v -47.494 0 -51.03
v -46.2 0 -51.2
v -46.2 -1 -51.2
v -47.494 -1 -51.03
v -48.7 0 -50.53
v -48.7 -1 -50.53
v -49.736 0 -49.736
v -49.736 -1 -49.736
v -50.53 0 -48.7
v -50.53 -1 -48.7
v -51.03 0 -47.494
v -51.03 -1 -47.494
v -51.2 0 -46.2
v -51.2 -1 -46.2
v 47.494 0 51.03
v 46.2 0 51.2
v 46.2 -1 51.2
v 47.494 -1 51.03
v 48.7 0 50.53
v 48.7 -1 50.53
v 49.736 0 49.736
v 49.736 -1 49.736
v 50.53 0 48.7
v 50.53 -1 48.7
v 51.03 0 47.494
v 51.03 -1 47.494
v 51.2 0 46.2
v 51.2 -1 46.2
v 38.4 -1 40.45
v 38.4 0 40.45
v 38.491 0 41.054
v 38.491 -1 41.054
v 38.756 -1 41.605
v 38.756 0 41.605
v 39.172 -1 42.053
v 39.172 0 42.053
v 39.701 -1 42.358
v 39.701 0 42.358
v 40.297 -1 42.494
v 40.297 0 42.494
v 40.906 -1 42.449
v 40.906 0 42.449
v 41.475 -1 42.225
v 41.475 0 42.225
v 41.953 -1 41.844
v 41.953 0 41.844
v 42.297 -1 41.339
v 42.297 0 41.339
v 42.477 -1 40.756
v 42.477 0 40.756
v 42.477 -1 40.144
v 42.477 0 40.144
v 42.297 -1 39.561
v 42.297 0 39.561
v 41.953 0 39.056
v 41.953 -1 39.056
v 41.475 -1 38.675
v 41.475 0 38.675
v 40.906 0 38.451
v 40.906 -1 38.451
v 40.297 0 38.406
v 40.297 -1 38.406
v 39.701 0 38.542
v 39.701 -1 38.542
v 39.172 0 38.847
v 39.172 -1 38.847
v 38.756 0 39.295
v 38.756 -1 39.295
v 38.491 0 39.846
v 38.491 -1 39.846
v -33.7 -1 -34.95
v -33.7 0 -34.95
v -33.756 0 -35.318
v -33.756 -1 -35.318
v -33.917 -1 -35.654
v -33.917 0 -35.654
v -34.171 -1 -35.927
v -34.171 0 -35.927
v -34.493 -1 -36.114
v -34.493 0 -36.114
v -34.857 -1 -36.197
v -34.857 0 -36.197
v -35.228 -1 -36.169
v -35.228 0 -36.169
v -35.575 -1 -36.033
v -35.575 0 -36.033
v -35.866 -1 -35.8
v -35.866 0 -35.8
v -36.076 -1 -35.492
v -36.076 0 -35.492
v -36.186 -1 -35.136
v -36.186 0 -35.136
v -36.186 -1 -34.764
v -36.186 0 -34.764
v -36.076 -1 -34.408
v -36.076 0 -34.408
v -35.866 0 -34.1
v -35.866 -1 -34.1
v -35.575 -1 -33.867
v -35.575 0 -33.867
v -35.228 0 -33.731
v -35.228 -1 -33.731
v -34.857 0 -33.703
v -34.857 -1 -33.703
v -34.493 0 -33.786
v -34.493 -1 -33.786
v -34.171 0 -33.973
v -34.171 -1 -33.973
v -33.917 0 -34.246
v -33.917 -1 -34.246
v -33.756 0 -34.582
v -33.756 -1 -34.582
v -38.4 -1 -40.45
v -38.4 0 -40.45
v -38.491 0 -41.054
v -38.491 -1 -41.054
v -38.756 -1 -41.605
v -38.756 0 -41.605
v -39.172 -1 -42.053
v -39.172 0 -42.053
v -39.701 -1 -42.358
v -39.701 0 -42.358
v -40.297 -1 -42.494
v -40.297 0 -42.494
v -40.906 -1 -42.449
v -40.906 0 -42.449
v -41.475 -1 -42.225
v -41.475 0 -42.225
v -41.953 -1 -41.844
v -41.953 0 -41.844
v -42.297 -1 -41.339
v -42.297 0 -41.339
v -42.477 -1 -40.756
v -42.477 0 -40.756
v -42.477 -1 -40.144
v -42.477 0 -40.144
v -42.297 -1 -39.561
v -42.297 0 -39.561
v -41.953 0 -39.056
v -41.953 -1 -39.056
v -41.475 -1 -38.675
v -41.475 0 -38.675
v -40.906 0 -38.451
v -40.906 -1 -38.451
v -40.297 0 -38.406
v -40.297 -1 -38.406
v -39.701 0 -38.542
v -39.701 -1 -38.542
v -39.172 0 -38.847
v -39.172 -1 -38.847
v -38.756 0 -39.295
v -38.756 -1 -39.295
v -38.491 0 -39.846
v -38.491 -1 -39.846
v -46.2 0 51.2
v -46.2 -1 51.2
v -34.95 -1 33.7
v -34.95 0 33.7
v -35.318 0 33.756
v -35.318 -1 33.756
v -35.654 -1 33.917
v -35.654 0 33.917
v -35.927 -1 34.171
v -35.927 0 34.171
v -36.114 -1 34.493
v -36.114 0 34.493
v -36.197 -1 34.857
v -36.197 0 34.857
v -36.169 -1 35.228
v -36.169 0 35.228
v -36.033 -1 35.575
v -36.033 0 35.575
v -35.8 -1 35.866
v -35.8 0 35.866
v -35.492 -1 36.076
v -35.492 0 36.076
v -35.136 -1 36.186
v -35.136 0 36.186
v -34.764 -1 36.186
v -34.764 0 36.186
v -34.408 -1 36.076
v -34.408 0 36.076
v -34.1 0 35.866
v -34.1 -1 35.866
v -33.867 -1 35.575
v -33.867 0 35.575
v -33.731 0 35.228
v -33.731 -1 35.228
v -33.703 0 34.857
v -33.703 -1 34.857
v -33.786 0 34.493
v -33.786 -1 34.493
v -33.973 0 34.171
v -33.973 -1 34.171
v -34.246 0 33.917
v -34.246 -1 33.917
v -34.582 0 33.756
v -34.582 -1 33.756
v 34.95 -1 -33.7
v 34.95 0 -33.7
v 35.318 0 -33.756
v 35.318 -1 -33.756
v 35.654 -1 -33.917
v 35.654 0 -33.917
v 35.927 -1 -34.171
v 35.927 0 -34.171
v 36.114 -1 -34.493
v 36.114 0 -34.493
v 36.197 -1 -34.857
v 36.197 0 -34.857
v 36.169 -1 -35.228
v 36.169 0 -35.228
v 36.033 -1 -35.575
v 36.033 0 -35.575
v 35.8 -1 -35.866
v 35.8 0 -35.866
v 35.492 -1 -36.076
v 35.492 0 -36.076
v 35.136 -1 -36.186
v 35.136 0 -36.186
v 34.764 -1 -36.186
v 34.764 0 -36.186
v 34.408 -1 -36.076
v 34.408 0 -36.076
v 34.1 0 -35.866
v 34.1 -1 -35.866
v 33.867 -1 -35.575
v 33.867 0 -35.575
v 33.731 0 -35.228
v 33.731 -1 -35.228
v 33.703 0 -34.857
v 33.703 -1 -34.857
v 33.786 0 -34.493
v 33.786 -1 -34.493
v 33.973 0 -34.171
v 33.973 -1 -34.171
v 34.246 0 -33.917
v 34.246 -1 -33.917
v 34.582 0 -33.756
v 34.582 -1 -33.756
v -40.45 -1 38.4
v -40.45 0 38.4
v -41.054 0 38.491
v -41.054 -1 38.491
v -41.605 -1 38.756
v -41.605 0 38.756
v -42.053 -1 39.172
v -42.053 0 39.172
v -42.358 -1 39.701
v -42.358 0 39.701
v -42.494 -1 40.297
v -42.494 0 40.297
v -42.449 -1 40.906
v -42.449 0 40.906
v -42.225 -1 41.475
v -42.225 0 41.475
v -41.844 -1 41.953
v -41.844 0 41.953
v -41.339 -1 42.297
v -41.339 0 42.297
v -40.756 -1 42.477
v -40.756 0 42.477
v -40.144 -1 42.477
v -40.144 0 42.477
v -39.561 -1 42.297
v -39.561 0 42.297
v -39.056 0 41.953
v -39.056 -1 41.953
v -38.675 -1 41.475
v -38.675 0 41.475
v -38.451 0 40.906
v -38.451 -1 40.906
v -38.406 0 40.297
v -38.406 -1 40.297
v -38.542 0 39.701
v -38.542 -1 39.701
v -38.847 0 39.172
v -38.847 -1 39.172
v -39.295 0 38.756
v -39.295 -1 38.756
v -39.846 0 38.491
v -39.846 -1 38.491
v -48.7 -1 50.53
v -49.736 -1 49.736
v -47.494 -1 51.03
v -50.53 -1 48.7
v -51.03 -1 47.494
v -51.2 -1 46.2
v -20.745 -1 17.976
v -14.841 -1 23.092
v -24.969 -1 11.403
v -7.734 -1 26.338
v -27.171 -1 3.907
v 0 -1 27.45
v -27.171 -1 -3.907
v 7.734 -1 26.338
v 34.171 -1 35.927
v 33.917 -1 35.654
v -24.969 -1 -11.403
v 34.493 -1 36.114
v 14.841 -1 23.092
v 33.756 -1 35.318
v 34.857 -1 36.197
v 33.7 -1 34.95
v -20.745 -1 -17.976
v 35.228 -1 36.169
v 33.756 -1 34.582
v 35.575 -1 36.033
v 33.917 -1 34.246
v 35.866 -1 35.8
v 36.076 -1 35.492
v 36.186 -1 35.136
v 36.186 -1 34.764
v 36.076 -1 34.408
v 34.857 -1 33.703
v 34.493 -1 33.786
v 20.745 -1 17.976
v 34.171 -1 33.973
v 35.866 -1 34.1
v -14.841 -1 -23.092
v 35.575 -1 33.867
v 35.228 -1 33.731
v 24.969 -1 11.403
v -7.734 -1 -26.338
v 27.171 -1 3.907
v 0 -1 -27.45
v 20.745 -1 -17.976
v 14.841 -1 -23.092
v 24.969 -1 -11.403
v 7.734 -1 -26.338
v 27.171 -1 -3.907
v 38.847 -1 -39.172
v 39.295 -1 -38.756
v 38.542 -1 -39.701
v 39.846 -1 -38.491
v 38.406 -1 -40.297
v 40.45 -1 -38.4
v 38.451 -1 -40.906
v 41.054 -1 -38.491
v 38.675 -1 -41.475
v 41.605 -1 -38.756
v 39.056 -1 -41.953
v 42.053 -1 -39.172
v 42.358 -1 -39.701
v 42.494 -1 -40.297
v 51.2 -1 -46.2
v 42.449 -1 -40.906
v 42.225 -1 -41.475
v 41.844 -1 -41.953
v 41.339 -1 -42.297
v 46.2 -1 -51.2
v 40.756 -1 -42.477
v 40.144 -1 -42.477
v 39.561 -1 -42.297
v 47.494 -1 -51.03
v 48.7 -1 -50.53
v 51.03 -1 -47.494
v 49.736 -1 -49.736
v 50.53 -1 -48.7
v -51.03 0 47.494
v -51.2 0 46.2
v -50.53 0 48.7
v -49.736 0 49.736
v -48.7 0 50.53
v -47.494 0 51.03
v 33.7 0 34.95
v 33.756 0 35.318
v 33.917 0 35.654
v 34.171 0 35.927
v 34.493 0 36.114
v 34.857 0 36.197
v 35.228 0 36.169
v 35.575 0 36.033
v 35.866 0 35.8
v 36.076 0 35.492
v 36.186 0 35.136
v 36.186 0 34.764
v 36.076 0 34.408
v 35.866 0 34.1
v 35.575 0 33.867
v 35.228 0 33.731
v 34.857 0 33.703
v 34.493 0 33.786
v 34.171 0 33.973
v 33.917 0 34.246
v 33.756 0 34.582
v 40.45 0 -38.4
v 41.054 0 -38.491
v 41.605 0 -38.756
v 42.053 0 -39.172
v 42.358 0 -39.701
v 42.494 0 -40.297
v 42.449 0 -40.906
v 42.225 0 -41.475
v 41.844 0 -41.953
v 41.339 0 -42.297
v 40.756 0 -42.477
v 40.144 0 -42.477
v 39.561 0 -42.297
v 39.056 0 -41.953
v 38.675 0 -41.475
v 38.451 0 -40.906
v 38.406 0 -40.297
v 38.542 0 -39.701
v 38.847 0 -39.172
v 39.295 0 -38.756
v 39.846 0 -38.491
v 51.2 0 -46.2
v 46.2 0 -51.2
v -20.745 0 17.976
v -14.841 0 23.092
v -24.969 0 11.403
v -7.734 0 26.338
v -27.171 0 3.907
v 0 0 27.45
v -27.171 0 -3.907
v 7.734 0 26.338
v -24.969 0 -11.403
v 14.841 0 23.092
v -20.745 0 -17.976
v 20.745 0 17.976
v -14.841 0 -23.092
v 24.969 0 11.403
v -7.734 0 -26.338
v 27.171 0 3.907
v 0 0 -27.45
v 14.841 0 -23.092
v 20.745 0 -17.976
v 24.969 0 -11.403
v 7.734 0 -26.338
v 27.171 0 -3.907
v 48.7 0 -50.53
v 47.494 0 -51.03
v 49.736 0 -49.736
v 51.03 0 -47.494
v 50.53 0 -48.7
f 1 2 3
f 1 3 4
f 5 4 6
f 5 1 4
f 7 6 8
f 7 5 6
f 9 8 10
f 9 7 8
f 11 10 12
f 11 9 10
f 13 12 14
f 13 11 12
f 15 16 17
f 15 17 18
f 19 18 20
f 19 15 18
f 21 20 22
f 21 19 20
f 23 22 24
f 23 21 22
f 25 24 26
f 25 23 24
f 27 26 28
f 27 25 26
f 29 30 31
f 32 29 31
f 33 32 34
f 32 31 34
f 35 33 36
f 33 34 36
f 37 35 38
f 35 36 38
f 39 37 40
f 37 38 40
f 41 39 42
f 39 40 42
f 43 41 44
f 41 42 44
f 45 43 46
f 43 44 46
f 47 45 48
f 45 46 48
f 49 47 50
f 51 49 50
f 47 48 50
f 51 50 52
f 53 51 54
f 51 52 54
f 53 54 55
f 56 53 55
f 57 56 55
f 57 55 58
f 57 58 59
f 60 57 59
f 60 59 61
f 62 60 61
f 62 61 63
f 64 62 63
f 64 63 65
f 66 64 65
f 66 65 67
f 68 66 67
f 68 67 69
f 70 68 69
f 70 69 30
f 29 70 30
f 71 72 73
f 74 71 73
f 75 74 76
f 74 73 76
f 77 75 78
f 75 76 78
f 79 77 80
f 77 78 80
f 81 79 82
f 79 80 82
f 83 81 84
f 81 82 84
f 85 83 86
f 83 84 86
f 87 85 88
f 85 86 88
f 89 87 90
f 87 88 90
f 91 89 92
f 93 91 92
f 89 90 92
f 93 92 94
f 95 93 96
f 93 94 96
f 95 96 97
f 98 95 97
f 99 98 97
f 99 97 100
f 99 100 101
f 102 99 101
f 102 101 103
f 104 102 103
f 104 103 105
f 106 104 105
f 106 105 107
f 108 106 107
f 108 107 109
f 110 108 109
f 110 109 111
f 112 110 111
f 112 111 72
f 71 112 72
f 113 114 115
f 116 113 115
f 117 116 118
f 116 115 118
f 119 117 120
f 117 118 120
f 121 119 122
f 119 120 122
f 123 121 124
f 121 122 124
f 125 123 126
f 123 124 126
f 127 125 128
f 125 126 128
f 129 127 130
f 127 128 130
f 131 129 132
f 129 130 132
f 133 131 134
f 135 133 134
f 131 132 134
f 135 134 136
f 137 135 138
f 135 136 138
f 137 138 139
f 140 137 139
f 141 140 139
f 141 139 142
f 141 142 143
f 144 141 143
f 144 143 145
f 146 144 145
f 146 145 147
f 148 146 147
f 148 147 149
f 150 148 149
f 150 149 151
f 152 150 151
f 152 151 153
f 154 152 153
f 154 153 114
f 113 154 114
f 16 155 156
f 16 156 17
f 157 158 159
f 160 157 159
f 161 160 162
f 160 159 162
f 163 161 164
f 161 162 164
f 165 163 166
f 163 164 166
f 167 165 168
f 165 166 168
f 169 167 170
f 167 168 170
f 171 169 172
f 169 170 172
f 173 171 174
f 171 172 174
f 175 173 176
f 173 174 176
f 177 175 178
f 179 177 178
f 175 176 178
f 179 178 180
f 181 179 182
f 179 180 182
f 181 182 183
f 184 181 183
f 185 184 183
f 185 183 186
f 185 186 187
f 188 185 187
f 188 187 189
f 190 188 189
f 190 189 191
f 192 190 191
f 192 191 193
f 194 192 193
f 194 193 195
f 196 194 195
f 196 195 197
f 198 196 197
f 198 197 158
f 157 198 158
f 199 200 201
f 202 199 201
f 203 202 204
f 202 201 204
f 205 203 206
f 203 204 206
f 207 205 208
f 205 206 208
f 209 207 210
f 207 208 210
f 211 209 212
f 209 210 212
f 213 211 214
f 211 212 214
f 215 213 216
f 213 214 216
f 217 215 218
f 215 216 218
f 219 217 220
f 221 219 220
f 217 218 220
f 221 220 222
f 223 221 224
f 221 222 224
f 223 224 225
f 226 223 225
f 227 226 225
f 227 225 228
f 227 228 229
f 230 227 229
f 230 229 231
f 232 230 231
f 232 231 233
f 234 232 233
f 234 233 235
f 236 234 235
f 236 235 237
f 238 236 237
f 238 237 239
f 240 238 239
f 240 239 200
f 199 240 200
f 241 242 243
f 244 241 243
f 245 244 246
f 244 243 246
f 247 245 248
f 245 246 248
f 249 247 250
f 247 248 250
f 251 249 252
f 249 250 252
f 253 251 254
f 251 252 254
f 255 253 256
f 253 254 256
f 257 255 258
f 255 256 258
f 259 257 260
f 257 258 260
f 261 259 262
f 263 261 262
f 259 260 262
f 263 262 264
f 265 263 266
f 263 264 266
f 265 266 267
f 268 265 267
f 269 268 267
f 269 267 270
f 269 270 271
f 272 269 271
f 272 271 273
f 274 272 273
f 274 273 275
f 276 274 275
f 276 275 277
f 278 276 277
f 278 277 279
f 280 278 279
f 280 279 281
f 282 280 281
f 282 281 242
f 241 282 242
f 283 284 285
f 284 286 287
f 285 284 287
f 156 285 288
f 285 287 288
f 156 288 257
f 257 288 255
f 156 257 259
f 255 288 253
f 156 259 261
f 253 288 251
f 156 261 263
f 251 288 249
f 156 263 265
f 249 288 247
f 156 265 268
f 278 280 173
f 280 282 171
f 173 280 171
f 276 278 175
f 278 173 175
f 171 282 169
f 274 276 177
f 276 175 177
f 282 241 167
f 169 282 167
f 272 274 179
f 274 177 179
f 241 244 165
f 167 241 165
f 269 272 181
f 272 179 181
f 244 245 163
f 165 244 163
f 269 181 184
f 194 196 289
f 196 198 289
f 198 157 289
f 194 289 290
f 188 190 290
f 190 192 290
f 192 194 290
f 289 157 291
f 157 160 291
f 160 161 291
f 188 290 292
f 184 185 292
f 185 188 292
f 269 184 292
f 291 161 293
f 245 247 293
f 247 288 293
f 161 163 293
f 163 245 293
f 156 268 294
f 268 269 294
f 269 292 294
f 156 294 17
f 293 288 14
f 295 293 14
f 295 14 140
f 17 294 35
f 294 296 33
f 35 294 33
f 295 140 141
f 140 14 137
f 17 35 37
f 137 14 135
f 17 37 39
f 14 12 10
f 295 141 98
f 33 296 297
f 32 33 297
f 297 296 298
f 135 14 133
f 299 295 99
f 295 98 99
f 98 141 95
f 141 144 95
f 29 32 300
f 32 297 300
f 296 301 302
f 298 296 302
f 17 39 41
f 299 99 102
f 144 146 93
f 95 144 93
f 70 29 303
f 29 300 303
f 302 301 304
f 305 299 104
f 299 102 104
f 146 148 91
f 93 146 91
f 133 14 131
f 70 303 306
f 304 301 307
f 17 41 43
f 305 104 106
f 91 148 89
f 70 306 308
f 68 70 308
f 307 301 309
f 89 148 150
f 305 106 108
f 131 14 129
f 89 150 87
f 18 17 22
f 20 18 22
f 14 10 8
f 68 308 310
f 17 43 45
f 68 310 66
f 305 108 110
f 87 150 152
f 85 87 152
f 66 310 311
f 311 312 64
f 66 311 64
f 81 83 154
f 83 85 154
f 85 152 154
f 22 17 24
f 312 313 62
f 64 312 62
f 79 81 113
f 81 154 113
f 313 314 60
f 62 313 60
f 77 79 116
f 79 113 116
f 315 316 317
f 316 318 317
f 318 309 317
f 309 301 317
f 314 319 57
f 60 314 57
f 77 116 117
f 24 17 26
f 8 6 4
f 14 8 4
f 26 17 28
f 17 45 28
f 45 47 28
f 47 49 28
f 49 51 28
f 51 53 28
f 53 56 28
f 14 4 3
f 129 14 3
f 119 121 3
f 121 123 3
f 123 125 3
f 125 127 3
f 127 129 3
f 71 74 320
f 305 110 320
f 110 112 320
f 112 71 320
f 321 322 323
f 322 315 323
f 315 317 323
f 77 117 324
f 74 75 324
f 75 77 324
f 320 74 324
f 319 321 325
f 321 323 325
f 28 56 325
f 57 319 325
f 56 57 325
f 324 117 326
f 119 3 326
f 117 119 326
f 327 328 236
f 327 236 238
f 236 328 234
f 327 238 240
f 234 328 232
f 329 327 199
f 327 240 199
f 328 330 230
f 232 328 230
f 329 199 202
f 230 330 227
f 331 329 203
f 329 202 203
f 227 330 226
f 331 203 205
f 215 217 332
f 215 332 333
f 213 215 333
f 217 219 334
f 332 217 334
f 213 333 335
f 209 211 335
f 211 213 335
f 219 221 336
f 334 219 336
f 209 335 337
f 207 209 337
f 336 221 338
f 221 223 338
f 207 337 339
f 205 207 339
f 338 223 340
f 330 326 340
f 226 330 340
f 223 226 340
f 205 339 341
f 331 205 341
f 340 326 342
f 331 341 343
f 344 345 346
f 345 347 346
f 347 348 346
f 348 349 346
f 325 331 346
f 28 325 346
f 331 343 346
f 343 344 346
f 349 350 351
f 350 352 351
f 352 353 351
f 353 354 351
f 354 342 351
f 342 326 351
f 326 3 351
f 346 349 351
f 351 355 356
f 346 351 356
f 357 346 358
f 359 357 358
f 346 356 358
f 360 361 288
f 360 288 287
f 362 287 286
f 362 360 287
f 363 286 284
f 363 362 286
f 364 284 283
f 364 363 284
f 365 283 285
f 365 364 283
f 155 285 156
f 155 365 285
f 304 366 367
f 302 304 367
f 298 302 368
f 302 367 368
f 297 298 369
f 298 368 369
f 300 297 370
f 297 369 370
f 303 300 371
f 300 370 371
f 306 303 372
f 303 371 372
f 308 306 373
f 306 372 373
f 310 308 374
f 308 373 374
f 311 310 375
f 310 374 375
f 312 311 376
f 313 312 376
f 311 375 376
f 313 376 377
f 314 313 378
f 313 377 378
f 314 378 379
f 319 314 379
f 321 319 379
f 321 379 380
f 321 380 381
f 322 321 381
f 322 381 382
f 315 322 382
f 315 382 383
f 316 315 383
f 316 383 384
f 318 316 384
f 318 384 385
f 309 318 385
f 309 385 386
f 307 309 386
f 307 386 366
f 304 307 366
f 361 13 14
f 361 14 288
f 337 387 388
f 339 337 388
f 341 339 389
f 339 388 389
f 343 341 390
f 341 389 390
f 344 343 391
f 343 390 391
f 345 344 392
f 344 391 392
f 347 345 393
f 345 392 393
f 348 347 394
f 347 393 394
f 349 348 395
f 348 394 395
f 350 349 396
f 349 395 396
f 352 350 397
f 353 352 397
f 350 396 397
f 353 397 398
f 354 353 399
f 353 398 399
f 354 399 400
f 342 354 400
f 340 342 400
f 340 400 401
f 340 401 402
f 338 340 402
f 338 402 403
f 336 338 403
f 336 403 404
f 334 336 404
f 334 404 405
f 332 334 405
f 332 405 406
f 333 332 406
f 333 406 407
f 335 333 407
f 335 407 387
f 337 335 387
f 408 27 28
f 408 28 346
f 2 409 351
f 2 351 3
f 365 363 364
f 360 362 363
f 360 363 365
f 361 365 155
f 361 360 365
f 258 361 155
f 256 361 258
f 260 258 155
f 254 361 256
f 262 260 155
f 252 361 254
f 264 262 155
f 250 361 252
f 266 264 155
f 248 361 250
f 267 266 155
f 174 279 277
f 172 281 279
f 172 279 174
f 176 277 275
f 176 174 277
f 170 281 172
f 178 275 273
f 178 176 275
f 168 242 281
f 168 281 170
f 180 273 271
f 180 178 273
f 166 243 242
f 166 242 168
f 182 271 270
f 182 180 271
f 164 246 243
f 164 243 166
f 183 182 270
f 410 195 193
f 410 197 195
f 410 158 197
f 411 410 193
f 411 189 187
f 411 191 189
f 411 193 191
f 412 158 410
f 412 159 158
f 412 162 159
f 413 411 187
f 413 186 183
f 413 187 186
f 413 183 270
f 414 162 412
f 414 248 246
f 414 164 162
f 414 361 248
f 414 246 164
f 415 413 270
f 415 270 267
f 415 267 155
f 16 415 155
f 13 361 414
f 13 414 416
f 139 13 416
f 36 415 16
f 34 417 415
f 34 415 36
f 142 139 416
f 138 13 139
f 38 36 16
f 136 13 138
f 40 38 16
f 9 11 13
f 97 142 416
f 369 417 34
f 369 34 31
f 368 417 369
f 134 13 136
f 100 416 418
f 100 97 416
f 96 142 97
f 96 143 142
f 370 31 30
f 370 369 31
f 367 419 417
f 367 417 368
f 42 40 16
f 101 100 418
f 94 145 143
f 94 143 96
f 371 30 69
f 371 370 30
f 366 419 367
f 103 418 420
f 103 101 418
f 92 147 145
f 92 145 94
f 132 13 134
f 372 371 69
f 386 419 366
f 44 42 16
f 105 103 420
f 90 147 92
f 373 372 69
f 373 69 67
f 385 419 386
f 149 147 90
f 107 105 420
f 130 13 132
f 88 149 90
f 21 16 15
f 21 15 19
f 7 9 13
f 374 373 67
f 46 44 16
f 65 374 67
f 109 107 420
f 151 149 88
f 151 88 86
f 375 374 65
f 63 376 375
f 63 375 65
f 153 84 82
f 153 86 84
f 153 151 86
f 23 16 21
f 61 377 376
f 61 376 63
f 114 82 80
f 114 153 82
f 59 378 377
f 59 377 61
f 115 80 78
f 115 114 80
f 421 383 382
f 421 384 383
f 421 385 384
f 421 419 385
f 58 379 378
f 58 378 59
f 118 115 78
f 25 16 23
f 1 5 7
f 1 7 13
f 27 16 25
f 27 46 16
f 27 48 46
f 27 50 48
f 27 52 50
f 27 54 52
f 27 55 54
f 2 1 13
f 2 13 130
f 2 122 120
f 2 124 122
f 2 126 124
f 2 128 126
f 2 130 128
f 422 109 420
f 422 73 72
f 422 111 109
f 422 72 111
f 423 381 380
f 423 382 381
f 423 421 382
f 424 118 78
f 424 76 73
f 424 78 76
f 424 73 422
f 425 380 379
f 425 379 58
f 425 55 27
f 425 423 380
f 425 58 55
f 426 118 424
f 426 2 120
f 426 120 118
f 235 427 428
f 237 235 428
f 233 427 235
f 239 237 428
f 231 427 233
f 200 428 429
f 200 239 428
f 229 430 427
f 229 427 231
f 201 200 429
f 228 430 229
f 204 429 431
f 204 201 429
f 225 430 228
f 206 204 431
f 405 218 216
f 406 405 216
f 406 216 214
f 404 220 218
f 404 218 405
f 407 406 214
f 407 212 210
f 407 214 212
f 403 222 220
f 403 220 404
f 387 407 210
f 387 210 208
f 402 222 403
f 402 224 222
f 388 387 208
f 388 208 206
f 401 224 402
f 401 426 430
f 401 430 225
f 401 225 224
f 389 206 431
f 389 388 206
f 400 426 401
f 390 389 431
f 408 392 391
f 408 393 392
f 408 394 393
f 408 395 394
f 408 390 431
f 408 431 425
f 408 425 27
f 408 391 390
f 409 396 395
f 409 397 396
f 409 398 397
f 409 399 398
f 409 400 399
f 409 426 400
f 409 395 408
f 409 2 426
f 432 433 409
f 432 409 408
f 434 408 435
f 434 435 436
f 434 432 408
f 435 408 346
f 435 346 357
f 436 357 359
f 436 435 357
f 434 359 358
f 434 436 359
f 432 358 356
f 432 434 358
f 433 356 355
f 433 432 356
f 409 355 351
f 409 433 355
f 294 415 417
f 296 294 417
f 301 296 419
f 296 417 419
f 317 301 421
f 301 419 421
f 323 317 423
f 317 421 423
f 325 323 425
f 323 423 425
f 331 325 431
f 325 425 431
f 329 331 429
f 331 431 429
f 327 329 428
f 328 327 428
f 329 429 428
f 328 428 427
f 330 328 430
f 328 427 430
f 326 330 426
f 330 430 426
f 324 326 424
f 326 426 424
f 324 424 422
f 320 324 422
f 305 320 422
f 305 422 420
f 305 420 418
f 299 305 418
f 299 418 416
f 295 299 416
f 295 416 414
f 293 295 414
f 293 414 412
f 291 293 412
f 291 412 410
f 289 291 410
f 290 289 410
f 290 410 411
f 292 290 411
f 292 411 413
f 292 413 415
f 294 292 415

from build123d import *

# Parameters (mm, degrees)
BASE_FLANGE1_DEPTH = 1
SKETCH6_R          = 27.45
CUT_EXTRUDE1_DEPTH = 10
SKETCH8_R          = 2.05
SKETCH8_R_2        = 1.25
CUT_EXTRUDE2_DEPTH = 10
CIRPATTERN1_COUNT  = 4


# Sheet-metal steps are written as plain solids
with BuildPart() as part:
    # Sketch1 → Base-Flange1 (new body)
    with BuildSketch(Plane(origin=(0, 0, 0), x_dir=(1, 0, 0), z_dir=(0, 1, 0))):
        with BuildLine():
            Line((-46.2, -51.2), (46.2, -51.2))
            ThreePointArc((46.2, -51.2), (49.735533906, -49.735533906), (51.2, -46.2))
            Line((51.2, -46.2), (51.2, 46.2))
            ThreePointArc((51.2, 46.2), (49.735533906, 49.735533906), (46.2, 51.2))
            Line((46.2, 51.2), (-46.2, 51.2))
            ThreePointArc((-46.2, 51.2), (-49.735533906, 49.735533906), (-51.2, 46.2))
            Line((-51.2, 46.2), (-51.2, -46.2))
            ThreePointArc((-51.2, -46.2), (-49.735533906, -49.735533906), (-46.2, -51.2))
        make_face()
    extrude(amount=-BASE_FLANGE1_DEPTH)

    # Sketch6 → Cut-Extrude1 (cut)
    with BuildSketch(Plane(origin=(0, 0, 0), x_dir=(1, 0, 0), z_dir=(0, 1, 0))):
        with Locations(Location((0, 0, 0), (0, 0, 270))):
            Circle(SKETCH6_R)
    extrude(amount=-CUT_EXTRUDE1_DEPTH, mode=Mode.SUBTRACT)

    # Sketch8 → Cut-Extrude2 (cut)
    with BuildSketch(Plane(origin=(0, 0, 0), x_dir=(1, 0, 0), z_dir=(0, 1, 0))):
        with Locations(Location((40.45, 40.45, 0), (0, 0, 270))):
            Circle(SKETCH8_R)
        with Locations(Location((34.95, 34.95, 0), (0, 0, 270))):
            Circle(SKETCH8_R_2)
    cut_extrude2 = extrude(amount=-CUT_EXTRUDE2_DEPTH, mode=Mode.SUBTRACT)

    # CirPattern1: Cut-Extrude2 ×4 about axis
    cirpattern1_axis = Axis((0, 0, 0), (0, 1, 0))
    for i in range(1, CIRPATTERN1_COUNT):
        add(cut_extrude2.rotate(cirpattern1_axis, i * 360 / CIRPATTERN1_COUNT), mode=Mode.SUBTRACT)


solid = part.part
